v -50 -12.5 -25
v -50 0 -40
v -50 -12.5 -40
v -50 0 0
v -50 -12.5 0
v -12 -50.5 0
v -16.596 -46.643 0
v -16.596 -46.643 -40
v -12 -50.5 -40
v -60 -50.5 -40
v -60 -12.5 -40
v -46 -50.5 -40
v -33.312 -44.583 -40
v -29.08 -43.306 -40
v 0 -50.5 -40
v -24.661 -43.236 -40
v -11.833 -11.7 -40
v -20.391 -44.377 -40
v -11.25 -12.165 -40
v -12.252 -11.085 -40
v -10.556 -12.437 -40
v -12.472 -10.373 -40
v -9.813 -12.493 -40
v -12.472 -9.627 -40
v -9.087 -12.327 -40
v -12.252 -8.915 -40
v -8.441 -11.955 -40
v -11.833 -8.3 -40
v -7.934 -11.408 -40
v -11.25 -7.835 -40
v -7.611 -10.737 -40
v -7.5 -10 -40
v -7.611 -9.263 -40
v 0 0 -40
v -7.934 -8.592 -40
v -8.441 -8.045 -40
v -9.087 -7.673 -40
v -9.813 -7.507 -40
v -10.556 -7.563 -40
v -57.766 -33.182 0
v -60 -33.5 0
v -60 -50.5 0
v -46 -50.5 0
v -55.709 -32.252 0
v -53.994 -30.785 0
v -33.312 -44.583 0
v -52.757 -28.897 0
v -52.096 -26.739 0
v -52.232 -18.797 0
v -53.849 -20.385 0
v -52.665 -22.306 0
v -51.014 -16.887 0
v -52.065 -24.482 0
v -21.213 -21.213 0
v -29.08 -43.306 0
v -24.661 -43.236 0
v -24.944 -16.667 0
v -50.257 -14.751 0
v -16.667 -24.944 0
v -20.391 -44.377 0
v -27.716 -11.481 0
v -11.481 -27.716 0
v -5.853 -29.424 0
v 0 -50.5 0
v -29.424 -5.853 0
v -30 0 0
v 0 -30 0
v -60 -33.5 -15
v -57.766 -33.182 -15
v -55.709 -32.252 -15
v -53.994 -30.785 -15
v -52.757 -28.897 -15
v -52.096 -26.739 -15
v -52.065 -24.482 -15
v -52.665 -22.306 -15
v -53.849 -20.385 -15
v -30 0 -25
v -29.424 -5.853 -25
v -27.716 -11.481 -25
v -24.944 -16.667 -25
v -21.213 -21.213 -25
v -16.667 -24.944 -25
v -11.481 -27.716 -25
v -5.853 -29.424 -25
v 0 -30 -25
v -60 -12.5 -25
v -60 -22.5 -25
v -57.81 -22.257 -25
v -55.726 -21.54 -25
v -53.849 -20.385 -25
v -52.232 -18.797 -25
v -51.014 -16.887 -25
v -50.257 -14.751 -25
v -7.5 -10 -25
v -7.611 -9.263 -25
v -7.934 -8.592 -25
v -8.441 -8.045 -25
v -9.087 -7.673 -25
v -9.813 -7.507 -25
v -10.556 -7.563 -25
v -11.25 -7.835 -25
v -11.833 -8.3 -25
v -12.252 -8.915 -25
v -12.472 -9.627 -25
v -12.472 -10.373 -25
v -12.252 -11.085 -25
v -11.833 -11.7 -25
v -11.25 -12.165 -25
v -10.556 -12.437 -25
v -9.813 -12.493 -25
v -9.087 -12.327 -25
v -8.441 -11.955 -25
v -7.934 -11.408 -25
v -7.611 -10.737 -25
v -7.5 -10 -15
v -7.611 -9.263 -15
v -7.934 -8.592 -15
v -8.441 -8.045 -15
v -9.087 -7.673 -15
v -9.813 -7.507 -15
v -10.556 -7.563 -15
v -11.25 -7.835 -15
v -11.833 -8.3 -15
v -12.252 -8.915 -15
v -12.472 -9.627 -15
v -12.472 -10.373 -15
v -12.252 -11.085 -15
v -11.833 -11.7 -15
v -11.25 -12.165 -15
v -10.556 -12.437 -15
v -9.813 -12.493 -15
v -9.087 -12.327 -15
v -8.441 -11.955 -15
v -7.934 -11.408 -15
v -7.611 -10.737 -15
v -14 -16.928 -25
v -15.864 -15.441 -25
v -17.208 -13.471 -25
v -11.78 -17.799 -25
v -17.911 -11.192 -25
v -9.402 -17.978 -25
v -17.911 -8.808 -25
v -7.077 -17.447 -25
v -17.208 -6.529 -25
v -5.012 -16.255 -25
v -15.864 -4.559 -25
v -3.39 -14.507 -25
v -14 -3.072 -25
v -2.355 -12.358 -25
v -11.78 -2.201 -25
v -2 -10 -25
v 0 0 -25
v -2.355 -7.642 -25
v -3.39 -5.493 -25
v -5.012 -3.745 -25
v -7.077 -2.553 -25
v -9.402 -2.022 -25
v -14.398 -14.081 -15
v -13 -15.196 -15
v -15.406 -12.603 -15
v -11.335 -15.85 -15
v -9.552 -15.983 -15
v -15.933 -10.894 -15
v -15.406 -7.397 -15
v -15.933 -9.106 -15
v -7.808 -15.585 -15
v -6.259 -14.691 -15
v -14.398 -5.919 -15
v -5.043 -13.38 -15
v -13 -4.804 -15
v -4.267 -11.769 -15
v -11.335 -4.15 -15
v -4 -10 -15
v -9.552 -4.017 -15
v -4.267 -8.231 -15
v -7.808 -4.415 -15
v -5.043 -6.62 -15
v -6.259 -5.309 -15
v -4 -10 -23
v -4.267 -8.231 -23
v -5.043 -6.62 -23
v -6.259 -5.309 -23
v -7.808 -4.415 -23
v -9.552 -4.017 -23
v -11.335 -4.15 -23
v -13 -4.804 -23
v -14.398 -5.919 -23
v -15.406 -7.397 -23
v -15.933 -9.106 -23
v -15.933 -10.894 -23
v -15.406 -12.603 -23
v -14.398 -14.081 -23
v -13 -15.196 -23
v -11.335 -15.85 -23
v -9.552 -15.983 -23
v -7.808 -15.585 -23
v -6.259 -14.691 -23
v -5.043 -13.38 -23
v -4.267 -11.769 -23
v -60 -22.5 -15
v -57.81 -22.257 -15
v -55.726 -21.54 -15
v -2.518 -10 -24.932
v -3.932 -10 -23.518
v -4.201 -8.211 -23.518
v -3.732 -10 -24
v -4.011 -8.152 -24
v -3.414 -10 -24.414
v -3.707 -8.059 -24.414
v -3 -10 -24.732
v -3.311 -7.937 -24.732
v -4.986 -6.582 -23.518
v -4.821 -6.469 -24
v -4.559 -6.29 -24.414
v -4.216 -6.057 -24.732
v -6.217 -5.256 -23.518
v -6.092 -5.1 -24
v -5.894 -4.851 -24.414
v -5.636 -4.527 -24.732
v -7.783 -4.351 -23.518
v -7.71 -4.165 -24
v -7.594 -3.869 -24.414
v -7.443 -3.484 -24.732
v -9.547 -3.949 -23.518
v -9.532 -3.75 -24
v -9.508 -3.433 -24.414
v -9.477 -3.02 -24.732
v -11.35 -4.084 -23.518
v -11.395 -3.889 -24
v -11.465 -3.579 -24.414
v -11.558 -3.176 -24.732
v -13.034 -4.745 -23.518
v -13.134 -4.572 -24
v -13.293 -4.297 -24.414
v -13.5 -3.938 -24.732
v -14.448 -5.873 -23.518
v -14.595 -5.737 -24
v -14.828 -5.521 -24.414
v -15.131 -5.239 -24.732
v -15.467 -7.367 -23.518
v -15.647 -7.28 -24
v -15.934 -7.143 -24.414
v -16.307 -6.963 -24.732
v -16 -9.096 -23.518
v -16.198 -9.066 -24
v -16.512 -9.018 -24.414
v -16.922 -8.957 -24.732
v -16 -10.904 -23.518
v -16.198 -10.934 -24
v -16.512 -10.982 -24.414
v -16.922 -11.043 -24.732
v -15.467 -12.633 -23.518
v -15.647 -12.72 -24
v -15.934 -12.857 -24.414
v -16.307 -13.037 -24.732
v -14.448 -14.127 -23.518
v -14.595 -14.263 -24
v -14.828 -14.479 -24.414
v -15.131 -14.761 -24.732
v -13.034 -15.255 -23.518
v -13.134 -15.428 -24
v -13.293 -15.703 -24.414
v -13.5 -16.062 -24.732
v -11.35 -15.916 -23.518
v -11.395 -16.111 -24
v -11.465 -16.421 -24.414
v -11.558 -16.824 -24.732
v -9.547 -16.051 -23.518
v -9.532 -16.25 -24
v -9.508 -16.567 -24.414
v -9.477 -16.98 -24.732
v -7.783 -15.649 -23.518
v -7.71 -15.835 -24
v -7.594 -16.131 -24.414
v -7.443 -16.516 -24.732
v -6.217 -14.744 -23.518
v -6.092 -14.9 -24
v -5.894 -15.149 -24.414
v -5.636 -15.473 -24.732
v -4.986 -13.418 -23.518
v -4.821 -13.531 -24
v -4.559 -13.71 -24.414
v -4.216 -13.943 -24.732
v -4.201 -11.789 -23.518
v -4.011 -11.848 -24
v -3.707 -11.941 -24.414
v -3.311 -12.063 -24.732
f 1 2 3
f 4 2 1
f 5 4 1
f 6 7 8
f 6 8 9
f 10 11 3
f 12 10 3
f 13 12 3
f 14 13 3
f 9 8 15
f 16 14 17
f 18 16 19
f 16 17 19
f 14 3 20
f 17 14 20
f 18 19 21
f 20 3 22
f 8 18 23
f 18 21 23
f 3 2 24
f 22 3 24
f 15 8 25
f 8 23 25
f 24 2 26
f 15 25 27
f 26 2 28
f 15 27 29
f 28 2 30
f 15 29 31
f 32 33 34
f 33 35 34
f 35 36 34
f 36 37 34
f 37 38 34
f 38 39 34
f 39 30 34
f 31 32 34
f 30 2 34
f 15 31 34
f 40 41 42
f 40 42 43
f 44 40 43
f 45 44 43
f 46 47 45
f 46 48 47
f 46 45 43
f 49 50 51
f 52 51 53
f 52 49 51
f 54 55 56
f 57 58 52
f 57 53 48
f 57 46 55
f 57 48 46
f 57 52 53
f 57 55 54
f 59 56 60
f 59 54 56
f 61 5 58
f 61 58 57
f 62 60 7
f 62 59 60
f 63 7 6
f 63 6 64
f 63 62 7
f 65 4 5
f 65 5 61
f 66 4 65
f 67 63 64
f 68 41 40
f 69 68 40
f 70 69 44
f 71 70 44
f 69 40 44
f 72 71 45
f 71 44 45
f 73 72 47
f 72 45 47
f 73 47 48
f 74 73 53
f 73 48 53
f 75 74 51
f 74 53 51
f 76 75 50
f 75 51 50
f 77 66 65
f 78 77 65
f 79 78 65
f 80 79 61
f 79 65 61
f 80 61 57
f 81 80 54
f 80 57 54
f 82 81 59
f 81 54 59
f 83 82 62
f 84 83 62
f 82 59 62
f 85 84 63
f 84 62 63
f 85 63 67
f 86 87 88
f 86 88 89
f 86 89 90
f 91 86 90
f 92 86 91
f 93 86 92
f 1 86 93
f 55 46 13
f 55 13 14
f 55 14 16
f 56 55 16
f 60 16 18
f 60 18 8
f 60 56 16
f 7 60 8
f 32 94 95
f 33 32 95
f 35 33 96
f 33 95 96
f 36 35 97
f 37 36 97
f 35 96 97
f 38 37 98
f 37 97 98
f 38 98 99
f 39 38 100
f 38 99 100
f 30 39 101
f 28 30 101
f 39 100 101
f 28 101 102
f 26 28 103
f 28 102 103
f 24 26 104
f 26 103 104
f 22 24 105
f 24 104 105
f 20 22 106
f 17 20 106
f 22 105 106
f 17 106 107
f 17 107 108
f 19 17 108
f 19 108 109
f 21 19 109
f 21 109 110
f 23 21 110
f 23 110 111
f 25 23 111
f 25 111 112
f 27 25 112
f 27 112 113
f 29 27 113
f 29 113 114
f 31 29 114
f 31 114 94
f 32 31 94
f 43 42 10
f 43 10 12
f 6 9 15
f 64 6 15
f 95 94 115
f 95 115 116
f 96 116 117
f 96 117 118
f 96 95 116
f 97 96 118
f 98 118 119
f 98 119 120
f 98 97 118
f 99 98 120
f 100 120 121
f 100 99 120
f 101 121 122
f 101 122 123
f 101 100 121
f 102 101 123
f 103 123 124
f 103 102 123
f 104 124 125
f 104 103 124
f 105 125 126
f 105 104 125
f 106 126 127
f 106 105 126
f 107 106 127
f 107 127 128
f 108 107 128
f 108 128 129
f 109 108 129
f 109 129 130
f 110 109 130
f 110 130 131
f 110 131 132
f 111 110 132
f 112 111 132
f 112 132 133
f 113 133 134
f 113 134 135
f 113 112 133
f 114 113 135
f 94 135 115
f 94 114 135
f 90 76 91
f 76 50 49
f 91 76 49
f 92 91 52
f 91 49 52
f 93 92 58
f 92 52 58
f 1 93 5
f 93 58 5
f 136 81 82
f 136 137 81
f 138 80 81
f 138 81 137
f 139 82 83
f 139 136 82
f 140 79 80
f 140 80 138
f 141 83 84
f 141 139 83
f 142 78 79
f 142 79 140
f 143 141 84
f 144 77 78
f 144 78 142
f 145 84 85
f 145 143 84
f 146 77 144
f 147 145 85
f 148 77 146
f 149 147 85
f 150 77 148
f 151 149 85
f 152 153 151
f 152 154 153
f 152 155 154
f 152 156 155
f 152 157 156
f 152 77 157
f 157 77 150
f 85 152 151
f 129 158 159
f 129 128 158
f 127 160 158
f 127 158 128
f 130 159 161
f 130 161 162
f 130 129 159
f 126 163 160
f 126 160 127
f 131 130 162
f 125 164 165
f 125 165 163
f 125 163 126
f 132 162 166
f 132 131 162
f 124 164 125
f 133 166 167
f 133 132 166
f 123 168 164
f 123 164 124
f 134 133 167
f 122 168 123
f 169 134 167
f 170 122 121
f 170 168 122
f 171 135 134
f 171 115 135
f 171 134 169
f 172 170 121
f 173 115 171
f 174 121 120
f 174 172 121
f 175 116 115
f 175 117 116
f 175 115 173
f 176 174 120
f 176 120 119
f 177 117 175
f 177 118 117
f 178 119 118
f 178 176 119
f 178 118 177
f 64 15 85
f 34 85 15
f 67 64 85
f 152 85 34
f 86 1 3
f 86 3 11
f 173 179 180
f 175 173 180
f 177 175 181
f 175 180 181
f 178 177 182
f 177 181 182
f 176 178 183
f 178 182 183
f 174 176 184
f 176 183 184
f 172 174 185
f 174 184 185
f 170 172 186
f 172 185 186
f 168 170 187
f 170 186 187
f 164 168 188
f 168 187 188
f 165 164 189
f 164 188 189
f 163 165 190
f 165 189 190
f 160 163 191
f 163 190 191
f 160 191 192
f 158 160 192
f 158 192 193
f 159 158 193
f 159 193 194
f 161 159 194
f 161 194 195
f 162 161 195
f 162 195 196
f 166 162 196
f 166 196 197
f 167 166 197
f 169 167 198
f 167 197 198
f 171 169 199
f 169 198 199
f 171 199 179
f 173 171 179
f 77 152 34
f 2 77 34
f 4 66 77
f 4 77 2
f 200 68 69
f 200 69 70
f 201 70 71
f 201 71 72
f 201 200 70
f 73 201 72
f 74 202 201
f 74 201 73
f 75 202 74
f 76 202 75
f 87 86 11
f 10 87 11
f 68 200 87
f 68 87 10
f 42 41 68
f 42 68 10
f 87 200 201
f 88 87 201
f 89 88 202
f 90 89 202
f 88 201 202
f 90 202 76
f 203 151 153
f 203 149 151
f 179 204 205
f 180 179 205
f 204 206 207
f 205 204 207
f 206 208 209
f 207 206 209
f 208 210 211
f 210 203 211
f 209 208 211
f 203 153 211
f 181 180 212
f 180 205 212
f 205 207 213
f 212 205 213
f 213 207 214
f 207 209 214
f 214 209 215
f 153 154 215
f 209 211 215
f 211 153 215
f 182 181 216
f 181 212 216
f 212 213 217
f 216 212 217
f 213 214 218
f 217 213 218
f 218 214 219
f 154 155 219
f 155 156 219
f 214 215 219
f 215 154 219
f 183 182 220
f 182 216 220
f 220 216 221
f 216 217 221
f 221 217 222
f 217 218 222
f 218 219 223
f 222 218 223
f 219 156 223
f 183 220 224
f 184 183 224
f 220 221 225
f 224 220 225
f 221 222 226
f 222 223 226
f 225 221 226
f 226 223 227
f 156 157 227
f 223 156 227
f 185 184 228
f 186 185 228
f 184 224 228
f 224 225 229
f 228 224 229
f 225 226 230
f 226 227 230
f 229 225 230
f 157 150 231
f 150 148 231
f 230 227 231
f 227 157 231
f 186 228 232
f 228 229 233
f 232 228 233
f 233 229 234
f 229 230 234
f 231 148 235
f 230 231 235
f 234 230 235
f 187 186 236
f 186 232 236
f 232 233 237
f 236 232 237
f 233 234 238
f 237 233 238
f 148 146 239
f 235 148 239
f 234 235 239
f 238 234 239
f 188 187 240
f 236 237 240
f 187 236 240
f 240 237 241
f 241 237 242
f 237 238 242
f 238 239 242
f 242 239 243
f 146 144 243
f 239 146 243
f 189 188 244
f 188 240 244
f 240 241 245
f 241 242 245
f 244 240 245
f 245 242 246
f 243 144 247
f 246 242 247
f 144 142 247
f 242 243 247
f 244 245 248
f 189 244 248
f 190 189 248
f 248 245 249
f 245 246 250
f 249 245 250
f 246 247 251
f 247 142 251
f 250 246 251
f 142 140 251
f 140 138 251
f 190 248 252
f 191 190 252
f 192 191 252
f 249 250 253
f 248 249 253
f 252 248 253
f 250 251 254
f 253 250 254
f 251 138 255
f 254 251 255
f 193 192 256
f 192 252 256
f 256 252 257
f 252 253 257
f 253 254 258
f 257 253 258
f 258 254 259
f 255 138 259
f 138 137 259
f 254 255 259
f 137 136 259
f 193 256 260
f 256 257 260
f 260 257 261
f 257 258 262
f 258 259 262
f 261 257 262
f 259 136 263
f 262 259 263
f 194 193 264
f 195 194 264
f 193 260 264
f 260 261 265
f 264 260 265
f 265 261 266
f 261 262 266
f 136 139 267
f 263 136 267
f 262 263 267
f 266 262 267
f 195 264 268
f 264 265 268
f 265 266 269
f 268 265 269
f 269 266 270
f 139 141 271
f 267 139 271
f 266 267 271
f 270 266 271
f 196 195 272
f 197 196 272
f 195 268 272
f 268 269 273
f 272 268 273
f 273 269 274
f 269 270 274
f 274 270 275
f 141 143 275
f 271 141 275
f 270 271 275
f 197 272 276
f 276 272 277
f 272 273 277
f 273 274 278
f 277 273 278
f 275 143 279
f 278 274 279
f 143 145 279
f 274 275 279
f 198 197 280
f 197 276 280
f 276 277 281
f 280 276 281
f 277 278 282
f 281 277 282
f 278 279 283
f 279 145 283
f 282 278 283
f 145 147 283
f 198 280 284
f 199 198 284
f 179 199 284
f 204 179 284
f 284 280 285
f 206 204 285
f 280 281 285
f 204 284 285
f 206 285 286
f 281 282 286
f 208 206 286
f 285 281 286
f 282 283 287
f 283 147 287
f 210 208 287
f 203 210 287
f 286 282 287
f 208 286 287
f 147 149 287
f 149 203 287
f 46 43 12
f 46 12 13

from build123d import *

# Parameters (mm, degrees)
BOSS_EXTRUDE1_DEPTH = 40
CUT_EXTRUDE1_DEPTH  = 25
CUT_EXTRUDE2_DEPTH  = 15
SKETCH3_R           = 2.5
CUT_EXTRUDE3_DEPTH  = 83.311906794
BOSS_EXTRUDE2_START = 10
SKETCH3_6_R         = 6
SKETCH3_6_R_2       = 2.5
BOSS_EXTRUDE2_DEPTH = 10
FILLET2_R           = 2


with BuildPart() as part:
    # Sketch1 → Boss-Extrude1 (new body)
    with BuildSketch(Plane.XY):
        with BuildLine():
            Line((0, 0), (-50, 0))
            Line((-50, 0), (-50, -12.5))
            Line((-50, -12.5), (-60, -12.5))
            Line((-60, -12.5), (-60, -50.5))
            Line((-60, -50.5), (-46, -50.5))
            Line((-46, -50.5), (-33.311690981, -44.583344336))
            ThreePointArc((-33.311690981, -44.583344336), (-24.66100943, -43.235991833), (-16.596266659, -46.643274342))
            Line((-16.596266659, -46.643274342), (-12, -50.5))
            Line((-12, -50.5), (0, -50.5))
            Line((0, -50.5), (0, 0))
        make_face()
    extrude(amount=-BOSS_EXTRUDE1_DEPTH)

    # Sketch2 → Cut-Extrude1 (cut)
    with BuildSketch(Plane.XY):
        with BuildLine():
            ThreePointArc((-60, -22.5), (-52.928932188, -19.571067812), (-50, -12.5))
            Line((-50, -12.5), (-60, -12.5))
            Line((-60, -12.5), (-60, -22.5))
        make_face()
        with BuildLine():
            Line((0, 0), (-30, 0))
            ThreePointArc((-30, 0), (-21.213203436, -21.213203436), (0, -30))
            Line((0, -30), (0, 0))
        make_face()
    extrude(amount=-CUT_EXTRUDE1_DEPTH, mode=Mode.SUBTRACT)

    # Sketch2<7> → Cut-Extrude2 (cut)
    with BuildSketch(Plane.XY):
        with BuildLine():
            ThreePointArc((-60, -33.5), (-52.756966211, -28.896831102), (-53.849159388, -20.384615385))
            ThreePointArc((-53.849159388, -20.384615385), (-56.747781822, -21.956377579), (-60, -22.5))
            Line((-60, -22.5), (-60, -33.5))
        make_face()
    extrude(amount=-CUT_EXTRUDE2_DEPTH, mode=Mode.SUBTRACT)

    # Sketch3 → Cut-Extrude3 (cut, through all)
    with BuildSketch(Plane.XY.offset(-25)):
        with Locations((-10, -10)):
            Circle(SKETCH3_R)
    extrude(amount=-CUT_EXTRUDE3_DEPTH, mode=Mode.SUBTRACT)

    # Sketch3<6> → Boss-Extrude2 (add)
    with BuildSketch(Plane.XY.offset(-25).offset(BOSS_EXTRUDE2_START)):
        with Locations((-10, -10)):
            Circle(SKETCH3_6_R)
        with Locations((-10, -10)):
            Circle(SKETCH3_6_R_2, mode=Mode.SUBTRACT)
    extrude(amount=-BOSS_EXTRUDE2_DEPTH)

    # Fillet2
    fillet2_edges = [part.edges().sort_by_distance(p)[0] for p in [
        (-16, -10, -25),
    ]]
    fillet(fillet2_edges, radius=FILLET2_R)


solid = part.part
